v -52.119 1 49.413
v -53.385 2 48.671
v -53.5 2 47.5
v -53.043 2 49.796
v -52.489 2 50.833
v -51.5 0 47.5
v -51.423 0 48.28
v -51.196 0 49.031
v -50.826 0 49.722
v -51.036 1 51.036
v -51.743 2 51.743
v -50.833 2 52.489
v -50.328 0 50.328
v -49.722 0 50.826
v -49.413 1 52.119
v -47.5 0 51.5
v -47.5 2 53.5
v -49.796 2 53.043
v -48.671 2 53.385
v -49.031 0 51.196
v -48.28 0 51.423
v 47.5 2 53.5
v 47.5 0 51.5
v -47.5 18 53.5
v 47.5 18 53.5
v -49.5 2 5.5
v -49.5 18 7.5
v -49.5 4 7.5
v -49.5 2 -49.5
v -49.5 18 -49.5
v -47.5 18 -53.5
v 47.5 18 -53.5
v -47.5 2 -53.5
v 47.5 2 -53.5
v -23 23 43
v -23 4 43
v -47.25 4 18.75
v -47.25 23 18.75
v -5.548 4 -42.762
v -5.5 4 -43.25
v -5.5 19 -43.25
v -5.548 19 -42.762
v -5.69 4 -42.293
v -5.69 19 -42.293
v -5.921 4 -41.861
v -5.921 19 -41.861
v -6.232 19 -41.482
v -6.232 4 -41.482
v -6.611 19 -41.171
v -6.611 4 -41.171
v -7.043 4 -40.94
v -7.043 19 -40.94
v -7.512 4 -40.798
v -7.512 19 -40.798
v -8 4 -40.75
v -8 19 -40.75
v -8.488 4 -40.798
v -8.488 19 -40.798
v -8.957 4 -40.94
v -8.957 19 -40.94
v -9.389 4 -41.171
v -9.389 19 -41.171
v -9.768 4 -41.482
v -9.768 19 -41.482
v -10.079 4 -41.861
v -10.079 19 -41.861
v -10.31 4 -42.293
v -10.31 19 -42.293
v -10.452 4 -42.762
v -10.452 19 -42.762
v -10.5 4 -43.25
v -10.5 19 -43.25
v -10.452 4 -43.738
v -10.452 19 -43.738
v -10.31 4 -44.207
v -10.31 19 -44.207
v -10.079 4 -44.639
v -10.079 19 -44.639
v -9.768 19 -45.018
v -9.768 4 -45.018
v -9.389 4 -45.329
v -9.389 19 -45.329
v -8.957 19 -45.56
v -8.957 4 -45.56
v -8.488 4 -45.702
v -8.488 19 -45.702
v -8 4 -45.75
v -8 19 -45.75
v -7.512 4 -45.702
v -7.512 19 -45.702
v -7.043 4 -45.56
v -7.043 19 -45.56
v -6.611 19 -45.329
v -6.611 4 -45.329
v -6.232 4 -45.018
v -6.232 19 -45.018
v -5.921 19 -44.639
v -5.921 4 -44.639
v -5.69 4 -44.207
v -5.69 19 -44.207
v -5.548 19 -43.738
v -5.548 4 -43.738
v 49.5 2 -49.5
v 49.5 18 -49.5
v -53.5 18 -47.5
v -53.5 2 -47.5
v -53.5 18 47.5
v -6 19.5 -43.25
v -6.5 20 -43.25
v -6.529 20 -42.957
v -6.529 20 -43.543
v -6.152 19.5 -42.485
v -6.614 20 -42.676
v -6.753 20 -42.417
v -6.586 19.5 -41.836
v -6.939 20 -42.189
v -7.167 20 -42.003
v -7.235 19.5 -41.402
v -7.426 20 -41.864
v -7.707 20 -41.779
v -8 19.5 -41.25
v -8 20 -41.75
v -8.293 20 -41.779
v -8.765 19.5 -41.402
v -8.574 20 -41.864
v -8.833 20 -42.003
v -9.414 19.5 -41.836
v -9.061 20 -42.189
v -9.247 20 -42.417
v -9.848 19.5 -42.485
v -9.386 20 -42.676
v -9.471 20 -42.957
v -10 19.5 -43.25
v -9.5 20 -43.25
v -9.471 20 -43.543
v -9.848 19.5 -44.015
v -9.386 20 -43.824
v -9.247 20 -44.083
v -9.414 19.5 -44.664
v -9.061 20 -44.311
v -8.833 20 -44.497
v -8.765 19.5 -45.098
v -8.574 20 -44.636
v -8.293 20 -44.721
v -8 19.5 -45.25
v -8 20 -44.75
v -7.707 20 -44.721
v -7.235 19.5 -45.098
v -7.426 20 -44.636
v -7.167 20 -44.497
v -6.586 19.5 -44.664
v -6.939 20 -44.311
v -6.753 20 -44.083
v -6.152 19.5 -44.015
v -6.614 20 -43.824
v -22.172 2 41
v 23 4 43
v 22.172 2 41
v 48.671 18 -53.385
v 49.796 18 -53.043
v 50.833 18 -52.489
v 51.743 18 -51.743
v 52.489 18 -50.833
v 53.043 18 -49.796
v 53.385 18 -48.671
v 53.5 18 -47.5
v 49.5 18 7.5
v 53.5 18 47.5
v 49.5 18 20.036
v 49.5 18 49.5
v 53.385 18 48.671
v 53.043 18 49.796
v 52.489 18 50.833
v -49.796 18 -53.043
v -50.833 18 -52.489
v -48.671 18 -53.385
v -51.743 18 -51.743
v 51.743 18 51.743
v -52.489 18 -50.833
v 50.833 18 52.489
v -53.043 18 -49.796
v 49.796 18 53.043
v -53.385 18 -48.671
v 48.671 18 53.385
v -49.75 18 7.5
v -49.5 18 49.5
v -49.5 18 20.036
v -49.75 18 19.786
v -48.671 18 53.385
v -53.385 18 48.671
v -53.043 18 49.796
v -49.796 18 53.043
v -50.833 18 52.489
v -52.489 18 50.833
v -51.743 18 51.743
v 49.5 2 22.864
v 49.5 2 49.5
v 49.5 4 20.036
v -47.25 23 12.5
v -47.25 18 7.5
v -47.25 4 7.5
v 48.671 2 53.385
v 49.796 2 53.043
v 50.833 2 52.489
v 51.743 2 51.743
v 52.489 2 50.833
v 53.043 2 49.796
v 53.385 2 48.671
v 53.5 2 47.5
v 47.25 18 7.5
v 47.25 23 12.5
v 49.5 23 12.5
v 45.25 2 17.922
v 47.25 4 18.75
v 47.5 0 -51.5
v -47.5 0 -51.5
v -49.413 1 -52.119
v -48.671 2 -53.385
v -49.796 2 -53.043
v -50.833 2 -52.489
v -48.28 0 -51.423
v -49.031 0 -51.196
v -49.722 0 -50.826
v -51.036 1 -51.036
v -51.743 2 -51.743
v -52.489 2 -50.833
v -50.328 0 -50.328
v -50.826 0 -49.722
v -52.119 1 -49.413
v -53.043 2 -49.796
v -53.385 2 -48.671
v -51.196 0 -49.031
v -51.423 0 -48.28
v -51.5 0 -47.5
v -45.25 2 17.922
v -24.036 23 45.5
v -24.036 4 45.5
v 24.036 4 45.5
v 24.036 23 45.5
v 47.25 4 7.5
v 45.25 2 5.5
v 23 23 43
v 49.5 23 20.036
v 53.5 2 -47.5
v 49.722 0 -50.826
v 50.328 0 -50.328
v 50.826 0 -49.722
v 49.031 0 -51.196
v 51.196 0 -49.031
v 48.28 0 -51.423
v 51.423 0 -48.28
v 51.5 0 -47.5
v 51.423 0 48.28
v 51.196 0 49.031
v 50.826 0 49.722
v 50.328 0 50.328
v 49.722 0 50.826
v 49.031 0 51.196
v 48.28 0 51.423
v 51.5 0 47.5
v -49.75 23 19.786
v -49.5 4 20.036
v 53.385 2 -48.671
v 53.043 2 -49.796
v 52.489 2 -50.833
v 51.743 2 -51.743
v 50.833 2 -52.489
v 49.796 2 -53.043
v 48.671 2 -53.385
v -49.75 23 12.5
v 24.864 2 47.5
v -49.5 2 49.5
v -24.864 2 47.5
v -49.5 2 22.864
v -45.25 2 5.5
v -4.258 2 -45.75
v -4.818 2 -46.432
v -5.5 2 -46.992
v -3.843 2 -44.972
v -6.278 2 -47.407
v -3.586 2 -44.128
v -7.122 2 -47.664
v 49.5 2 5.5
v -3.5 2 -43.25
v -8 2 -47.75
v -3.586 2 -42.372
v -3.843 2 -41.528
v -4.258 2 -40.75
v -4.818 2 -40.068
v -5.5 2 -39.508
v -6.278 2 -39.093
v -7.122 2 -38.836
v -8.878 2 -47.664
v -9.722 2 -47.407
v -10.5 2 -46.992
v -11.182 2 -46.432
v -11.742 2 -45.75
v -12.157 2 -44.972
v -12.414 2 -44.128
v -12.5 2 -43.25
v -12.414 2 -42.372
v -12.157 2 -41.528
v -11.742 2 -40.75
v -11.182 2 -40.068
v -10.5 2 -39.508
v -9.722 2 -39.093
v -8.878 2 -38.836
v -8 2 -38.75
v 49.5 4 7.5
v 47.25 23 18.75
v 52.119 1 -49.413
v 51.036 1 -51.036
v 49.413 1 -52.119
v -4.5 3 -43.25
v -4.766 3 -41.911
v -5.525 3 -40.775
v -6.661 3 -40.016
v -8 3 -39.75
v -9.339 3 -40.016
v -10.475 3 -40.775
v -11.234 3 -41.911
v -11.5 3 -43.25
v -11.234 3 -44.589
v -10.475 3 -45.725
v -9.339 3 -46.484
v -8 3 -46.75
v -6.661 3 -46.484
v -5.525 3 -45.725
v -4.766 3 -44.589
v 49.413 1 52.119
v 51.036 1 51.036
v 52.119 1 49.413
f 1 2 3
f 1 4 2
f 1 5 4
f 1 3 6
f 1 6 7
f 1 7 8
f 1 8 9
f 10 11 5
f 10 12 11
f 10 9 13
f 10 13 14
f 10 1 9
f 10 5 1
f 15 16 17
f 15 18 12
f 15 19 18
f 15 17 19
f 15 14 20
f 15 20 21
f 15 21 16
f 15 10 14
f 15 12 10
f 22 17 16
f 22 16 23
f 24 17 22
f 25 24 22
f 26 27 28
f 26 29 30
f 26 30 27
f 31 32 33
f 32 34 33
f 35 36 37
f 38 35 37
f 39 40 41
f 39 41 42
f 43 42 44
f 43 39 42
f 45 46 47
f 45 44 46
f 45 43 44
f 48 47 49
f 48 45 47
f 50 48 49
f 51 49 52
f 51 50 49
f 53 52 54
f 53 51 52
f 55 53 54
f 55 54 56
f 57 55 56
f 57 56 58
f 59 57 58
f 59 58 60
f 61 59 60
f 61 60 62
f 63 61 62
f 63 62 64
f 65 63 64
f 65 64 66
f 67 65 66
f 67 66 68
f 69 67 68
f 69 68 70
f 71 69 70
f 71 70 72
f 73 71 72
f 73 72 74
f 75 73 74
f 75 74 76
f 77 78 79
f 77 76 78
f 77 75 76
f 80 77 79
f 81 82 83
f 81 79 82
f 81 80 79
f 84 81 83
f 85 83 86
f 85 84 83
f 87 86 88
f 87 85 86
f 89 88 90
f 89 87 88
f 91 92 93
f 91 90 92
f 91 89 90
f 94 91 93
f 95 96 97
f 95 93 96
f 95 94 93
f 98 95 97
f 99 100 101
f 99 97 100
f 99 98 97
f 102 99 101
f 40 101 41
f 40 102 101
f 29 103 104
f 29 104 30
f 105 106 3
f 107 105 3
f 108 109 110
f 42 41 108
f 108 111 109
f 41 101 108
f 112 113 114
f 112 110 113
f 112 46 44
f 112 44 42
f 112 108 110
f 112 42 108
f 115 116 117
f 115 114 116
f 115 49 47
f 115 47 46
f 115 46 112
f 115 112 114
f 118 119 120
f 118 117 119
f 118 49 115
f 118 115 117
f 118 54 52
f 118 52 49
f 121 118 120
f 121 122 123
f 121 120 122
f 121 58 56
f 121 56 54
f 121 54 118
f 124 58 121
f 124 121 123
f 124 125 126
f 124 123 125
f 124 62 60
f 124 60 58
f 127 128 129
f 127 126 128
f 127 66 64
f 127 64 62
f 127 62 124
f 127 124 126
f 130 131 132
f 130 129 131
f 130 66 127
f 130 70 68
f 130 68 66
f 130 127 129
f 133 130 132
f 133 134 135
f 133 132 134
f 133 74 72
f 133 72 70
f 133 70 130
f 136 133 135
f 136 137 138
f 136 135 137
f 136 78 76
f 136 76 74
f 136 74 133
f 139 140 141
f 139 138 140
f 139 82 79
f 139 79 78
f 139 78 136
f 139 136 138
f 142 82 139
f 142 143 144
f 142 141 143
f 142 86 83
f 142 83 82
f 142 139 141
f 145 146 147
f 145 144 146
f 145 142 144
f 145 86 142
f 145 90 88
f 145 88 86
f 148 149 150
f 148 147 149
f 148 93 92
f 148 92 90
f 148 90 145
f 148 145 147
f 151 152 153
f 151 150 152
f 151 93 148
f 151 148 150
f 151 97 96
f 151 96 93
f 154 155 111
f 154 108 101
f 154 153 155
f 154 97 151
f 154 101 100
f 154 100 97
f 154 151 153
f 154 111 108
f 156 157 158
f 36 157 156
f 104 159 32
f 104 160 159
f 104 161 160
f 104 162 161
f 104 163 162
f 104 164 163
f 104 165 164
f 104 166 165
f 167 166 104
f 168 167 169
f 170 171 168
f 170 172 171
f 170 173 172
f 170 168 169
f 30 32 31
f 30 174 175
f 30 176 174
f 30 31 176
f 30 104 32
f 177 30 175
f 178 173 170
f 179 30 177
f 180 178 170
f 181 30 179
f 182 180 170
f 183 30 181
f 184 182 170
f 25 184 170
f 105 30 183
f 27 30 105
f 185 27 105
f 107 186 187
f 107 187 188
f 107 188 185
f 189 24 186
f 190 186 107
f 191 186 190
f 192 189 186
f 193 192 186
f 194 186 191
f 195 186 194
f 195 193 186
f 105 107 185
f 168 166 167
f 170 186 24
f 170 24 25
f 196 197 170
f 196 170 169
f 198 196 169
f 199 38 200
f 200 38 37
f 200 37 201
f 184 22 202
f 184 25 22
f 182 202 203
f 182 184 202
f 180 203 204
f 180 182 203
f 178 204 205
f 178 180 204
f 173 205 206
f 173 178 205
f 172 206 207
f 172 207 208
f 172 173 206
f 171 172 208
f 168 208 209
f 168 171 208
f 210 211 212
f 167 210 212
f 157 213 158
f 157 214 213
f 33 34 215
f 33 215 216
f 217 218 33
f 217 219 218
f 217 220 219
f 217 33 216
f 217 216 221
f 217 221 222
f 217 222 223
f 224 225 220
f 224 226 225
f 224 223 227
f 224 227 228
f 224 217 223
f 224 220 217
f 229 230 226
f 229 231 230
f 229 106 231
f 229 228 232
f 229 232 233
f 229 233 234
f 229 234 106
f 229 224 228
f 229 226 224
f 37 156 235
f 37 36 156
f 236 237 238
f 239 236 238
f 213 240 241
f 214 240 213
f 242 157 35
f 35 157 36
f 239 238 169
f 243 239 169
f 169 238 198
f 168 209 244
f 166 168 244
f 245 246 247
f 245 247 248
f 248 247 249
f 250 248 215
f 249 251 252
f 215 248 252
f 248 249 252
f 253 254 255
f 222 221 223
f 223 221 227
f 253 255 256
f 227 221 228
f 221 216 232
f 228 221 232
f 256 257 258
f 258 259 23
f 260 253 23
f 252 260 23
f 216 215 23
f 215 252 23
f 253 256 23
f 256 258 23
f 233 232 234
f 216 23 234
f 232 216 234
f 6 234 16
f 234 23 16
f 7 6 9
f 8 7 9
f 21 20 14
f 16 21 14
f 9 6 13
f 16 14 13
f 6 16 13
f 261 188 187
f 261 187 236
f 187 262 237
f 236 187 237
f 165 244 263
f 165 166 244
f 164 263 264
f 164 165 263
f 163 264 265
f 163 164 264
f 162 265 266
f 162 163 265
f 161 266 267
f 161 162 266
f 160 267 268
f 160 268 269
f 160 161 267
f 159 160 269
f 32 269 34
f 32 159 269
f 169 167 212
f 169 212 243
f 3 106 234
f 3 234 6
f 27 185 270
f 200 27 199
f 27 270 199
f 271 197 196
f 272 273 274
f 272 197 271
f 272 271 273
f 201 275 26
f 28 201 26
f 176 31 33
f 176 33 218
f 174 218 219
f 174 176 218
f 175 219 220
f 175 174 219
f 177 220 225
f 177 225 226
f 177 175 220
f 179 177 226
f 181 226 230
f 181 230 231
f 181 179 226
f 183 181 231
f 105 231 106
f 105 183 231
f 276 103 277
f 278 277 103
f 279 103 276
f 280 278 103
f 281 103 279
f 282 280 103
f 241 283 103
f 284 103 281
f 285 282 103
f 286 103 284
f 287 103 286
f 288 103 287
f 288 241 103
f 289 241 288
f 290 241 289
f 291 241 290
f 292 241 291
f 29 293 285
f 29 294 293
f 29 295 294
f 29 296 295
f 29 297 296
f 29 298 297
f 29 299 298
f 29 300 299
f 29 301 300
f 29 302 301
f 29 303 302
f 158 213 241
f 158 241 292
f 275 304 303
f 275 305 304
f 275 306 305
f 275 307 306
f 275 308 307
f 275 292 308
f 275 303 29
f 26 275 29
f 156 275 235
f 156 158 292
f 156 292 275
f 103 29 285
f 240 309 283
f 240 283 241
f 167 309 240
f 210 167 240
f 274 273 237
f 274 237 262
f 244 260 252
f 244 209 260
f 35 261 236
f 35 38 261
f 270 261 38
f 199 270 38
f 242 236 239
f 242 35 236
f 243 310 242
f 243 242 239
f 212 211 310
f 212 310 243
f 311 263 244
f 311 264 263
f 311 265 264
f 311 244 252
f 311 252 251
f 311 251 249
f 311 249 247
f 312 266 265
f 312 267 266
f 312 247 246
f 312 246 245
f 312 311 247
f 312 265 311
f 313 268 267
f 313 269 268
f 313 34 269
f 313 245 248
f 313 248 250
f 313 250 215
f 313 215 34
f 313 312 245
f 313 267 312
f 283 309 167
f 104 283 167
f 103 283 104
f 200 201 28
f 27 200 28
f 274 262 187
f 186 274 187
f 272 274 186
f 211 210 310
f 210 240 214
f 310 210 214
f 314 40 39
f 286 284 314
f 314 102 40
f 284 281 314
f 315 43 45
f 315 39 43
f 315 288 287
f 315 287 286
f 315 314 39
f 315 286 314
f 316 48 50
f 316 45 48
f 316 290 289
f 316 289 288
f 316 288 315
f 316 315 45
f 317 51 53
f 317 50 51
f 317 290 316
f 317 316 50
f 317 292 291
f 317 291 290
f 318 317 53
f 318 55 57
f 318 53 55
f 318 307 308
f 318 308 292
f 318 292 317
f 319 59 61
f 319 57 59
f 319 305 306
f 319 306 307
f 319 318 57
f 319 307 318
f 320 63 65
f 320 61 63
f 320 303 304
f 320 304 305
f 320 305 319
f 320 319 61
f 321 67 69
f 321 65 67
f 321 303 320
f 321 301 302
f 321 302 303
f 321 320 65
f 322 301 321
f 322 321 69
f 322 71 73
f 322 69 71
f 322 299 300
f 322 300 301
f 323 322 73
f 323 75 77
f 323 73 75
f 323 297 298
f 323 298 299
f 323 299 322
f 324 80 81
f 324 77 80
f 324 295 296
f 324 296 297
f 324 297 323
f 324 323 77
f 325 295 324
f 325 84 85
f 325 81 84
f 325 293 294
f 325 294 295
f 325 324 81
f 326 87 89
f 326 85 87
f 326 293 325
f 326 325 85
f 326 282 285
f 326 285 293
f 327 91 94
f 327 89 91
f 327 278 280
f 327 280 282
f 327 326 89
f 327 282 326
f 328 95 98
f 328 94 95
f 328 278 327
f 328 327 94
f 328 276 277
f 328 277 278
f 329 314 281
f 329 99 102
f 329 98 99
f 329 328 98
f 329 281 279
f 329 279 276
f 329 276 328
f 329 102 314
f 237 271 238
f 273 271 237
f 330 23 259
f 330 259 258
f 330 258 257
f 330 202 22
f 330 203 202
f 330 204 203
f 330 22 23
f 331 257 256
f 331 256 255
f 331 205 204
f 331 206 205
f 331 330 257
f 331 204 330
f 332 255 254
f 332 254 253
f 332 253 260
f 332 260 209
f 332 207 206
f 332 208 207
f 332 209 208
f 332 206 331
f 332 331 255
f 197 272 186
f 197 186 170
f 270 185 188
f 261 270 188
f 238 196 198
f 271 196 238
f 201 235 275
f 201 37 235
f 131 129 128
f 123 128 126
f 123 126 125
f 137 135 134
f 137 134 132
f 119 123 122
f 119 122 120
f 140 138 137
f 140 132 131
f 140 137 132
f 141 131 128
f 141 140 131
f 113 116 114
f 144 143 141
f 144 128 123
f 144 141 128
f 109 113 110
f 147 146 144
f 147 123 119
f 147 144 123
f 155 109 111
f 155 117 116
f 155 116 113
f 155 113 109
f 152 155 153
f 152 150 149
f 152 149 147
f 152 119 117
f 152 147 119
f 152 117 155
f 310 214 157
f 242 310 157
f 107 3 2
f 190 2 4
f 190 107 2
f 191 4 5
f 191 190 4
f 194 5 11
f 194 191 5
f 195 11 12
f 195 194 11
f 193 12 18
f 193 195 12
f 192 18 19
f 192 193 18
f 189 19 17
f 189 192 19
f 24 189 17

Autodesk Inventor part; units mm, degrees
ref_plane "YZ Plane" through (0, 0, 0) normal (1, 0, 0) x (0, 1, 0)
ref_plane "XZ Plane" through (0, 0, 0) normal (0, 1, 0) x (-1, 0, 0)
ref_plane "XY Plane" through (0, 0, 0) normal (0, 0, 1) x (1, 0, 0)
sketch "Náčrt1" plane through (0, 0, 0) normal (0, 1, 0) x (-1, 0, 0)
  line L0 (49.5, 49.5) -> (-49.5, 49.5)
  line L1 (-49.5, 49.5) -> (-49.5, -49.5)
  line L2 (-49.5, -49.5) -> (49.5, -49.5)
  line L3 (49.5, -49.5) -> (49.5, 49.5)
  line L4 (49.5, 49.5) -> (-49.5, -49.5) construction
  line L5 (-49.5, 49.5) -> (49.5, -49.5) construction
  line L6 (53.5, 53.5) -> (-53.5, 53.5)
  line L7 (-53.5, 53.5) -> (-53.5, -53.5)
  line L8 (-53.5, -53.5) -> (53.5, -53.5)
  line L9 (53.5, -53.5) -> (53.5, 53.5)
  line L10 (53.5, 53.5) -> (-53.5, -53.5) construction
  line L11 (-53.5, 53.5) -> (53.5, -53.5) construction
  point P0 (0, 0)
  dimension "d1" = 99
  dimension "d2" = 4
extrude "Vysunutí1" add sketch "Náčrt1" along normal blind 2 contours L3 L2 L1 L0
extrude "Vysunutí2" add sketch "Náčrt1" along normal blind 18
fillet "Zaoblení1" radius 6 4 edges at (53.5, 9, 53.5) (53.5, 9, -53.5) (-53.5, 9, -53.5) (-53.5, 9, 53.5)
chamfer "Zkosení1" distance 2 angle 45 8 edges at (0, 0, 53.5) (51.7426, 0, 51.7426) (53.5, 0, 0) (51.7426, 0, -51.7426) (0, 0, -53.5) (-51.7426, 0, -51.7426) (-53.5, 0, 0) (-51.7426, 0, 51.7426)
sketch "Náčrt2" plane through (0, 2, 0) normal (0, 1, 0) x (1, 0, 0)
  line L0 (47.25, -18.75) -> (23, -43)
  line L1 (23, -43) -> (-23, -43)
  line L2 (-23, -43) -> (-47.25, -18.75)
  line L3 (-49.75, -19.7855) -> (-24.0355, -45.5)
  line L4 (-24.0355, -45.5) -> (24.0355, -45.5)
  line L5 (24.0355, -45.5) -> (49.75, -19.7855)
  line L6 (49.75, -19.7855) -> (49.75, -7.5)
  line L7 (49.75, -7.5) -> (47.25, -7.5)
  line L8 (47.25, -7.5) -> (47.25, -18.75)
  line L9 (-47.25, -18.75) -> (-47.25, -7.5)
  line L10 (-47.25, -7.5) -> (-49.75, -7.5)
  line L11 (-49.75, -7.5) -> (-49.75, -19.7855)
  line L12 (49.5, -49.5) -> (-49.5, -49.5) projected
  line L13 (49.5, 49.5) -> (49.5, -49.5) projected
  point P0 (0, 0)
  point P1 (0, -45.5)
  point P2 (0, -49.5)
  point P3 (49.5, -20.0355)
  point P4 (49.5, -7.5)
  dimension "d12" = 2.5
  dimension "d13" = 2.5
  dimension "d14" = 2.5
  dimension "d15" = 46
  dimension "d16" = 135
  dimension "d17" = 2.5
  dimension "d18" = 2.5
  dimension "d19" = 38
  dimension "d20" = 99.5
  dimension "d21" = 11.25
  dimension "d22" = 4
extrude "Vysunutí3" add sketch "Náčrt2" along normal blind 21 contours L8 L7 L13 L5 L4 L3 L11 L10 L9 L2 L1 L0
sketch "Náčrt3" plane through (0, 2, 0) normal (0, 1, 0) x (1, 0, 0)
  circle A0 centre (-8, 43.25) radius 2.5
  circle A1 centre (-8, 43.25) radius 1.5
  line L0 (49.5, 49.5) -> (49.5, -7.5) projected
  line L1 (-49.5, -7.5) -> (-49.5, 49.5) projected
  line L2 (-49.5, 49.5) -> (49.5, 49.5) projected
  point P0 (0, 0)
  dimension "d27" = 3
  dimension "d28" = 5
  dimension "d39" = 41.5
  dimension "d43" = 6.25
extrude "Vysunutí4" add sketch "Náčrt3" along normal blind 18 contours A1
extrude "Vysunutí5" add sketch "Náčrt3" along normal blind 17
chamfer "Zkosení2" distance 1 angle 45 1 edges at (-9.5, 19, -43.25)
chamfer "Zkosení3" distance 2 angle 45 11 edges at (-10.5, 2, -43.25) (-35.125, 2, 30.875) (-47.25, 2, 13.125) (0, 2, 43) (35.125, 2, 30.875) (47.25, 2, 13.125) (48.375, 2, 7.5) (-48.375, 2, 7.5) (36.7678, 2, 32.7678) (0, 2, 45.5) (-36.7678, 2, 32.7678)
chamfer "Zkosení4" distance 5 angle 45 2 edges at (-48.5, 23, 7.5) (48.375, 23, 7.5)
properties part number "horni_vlozka"
